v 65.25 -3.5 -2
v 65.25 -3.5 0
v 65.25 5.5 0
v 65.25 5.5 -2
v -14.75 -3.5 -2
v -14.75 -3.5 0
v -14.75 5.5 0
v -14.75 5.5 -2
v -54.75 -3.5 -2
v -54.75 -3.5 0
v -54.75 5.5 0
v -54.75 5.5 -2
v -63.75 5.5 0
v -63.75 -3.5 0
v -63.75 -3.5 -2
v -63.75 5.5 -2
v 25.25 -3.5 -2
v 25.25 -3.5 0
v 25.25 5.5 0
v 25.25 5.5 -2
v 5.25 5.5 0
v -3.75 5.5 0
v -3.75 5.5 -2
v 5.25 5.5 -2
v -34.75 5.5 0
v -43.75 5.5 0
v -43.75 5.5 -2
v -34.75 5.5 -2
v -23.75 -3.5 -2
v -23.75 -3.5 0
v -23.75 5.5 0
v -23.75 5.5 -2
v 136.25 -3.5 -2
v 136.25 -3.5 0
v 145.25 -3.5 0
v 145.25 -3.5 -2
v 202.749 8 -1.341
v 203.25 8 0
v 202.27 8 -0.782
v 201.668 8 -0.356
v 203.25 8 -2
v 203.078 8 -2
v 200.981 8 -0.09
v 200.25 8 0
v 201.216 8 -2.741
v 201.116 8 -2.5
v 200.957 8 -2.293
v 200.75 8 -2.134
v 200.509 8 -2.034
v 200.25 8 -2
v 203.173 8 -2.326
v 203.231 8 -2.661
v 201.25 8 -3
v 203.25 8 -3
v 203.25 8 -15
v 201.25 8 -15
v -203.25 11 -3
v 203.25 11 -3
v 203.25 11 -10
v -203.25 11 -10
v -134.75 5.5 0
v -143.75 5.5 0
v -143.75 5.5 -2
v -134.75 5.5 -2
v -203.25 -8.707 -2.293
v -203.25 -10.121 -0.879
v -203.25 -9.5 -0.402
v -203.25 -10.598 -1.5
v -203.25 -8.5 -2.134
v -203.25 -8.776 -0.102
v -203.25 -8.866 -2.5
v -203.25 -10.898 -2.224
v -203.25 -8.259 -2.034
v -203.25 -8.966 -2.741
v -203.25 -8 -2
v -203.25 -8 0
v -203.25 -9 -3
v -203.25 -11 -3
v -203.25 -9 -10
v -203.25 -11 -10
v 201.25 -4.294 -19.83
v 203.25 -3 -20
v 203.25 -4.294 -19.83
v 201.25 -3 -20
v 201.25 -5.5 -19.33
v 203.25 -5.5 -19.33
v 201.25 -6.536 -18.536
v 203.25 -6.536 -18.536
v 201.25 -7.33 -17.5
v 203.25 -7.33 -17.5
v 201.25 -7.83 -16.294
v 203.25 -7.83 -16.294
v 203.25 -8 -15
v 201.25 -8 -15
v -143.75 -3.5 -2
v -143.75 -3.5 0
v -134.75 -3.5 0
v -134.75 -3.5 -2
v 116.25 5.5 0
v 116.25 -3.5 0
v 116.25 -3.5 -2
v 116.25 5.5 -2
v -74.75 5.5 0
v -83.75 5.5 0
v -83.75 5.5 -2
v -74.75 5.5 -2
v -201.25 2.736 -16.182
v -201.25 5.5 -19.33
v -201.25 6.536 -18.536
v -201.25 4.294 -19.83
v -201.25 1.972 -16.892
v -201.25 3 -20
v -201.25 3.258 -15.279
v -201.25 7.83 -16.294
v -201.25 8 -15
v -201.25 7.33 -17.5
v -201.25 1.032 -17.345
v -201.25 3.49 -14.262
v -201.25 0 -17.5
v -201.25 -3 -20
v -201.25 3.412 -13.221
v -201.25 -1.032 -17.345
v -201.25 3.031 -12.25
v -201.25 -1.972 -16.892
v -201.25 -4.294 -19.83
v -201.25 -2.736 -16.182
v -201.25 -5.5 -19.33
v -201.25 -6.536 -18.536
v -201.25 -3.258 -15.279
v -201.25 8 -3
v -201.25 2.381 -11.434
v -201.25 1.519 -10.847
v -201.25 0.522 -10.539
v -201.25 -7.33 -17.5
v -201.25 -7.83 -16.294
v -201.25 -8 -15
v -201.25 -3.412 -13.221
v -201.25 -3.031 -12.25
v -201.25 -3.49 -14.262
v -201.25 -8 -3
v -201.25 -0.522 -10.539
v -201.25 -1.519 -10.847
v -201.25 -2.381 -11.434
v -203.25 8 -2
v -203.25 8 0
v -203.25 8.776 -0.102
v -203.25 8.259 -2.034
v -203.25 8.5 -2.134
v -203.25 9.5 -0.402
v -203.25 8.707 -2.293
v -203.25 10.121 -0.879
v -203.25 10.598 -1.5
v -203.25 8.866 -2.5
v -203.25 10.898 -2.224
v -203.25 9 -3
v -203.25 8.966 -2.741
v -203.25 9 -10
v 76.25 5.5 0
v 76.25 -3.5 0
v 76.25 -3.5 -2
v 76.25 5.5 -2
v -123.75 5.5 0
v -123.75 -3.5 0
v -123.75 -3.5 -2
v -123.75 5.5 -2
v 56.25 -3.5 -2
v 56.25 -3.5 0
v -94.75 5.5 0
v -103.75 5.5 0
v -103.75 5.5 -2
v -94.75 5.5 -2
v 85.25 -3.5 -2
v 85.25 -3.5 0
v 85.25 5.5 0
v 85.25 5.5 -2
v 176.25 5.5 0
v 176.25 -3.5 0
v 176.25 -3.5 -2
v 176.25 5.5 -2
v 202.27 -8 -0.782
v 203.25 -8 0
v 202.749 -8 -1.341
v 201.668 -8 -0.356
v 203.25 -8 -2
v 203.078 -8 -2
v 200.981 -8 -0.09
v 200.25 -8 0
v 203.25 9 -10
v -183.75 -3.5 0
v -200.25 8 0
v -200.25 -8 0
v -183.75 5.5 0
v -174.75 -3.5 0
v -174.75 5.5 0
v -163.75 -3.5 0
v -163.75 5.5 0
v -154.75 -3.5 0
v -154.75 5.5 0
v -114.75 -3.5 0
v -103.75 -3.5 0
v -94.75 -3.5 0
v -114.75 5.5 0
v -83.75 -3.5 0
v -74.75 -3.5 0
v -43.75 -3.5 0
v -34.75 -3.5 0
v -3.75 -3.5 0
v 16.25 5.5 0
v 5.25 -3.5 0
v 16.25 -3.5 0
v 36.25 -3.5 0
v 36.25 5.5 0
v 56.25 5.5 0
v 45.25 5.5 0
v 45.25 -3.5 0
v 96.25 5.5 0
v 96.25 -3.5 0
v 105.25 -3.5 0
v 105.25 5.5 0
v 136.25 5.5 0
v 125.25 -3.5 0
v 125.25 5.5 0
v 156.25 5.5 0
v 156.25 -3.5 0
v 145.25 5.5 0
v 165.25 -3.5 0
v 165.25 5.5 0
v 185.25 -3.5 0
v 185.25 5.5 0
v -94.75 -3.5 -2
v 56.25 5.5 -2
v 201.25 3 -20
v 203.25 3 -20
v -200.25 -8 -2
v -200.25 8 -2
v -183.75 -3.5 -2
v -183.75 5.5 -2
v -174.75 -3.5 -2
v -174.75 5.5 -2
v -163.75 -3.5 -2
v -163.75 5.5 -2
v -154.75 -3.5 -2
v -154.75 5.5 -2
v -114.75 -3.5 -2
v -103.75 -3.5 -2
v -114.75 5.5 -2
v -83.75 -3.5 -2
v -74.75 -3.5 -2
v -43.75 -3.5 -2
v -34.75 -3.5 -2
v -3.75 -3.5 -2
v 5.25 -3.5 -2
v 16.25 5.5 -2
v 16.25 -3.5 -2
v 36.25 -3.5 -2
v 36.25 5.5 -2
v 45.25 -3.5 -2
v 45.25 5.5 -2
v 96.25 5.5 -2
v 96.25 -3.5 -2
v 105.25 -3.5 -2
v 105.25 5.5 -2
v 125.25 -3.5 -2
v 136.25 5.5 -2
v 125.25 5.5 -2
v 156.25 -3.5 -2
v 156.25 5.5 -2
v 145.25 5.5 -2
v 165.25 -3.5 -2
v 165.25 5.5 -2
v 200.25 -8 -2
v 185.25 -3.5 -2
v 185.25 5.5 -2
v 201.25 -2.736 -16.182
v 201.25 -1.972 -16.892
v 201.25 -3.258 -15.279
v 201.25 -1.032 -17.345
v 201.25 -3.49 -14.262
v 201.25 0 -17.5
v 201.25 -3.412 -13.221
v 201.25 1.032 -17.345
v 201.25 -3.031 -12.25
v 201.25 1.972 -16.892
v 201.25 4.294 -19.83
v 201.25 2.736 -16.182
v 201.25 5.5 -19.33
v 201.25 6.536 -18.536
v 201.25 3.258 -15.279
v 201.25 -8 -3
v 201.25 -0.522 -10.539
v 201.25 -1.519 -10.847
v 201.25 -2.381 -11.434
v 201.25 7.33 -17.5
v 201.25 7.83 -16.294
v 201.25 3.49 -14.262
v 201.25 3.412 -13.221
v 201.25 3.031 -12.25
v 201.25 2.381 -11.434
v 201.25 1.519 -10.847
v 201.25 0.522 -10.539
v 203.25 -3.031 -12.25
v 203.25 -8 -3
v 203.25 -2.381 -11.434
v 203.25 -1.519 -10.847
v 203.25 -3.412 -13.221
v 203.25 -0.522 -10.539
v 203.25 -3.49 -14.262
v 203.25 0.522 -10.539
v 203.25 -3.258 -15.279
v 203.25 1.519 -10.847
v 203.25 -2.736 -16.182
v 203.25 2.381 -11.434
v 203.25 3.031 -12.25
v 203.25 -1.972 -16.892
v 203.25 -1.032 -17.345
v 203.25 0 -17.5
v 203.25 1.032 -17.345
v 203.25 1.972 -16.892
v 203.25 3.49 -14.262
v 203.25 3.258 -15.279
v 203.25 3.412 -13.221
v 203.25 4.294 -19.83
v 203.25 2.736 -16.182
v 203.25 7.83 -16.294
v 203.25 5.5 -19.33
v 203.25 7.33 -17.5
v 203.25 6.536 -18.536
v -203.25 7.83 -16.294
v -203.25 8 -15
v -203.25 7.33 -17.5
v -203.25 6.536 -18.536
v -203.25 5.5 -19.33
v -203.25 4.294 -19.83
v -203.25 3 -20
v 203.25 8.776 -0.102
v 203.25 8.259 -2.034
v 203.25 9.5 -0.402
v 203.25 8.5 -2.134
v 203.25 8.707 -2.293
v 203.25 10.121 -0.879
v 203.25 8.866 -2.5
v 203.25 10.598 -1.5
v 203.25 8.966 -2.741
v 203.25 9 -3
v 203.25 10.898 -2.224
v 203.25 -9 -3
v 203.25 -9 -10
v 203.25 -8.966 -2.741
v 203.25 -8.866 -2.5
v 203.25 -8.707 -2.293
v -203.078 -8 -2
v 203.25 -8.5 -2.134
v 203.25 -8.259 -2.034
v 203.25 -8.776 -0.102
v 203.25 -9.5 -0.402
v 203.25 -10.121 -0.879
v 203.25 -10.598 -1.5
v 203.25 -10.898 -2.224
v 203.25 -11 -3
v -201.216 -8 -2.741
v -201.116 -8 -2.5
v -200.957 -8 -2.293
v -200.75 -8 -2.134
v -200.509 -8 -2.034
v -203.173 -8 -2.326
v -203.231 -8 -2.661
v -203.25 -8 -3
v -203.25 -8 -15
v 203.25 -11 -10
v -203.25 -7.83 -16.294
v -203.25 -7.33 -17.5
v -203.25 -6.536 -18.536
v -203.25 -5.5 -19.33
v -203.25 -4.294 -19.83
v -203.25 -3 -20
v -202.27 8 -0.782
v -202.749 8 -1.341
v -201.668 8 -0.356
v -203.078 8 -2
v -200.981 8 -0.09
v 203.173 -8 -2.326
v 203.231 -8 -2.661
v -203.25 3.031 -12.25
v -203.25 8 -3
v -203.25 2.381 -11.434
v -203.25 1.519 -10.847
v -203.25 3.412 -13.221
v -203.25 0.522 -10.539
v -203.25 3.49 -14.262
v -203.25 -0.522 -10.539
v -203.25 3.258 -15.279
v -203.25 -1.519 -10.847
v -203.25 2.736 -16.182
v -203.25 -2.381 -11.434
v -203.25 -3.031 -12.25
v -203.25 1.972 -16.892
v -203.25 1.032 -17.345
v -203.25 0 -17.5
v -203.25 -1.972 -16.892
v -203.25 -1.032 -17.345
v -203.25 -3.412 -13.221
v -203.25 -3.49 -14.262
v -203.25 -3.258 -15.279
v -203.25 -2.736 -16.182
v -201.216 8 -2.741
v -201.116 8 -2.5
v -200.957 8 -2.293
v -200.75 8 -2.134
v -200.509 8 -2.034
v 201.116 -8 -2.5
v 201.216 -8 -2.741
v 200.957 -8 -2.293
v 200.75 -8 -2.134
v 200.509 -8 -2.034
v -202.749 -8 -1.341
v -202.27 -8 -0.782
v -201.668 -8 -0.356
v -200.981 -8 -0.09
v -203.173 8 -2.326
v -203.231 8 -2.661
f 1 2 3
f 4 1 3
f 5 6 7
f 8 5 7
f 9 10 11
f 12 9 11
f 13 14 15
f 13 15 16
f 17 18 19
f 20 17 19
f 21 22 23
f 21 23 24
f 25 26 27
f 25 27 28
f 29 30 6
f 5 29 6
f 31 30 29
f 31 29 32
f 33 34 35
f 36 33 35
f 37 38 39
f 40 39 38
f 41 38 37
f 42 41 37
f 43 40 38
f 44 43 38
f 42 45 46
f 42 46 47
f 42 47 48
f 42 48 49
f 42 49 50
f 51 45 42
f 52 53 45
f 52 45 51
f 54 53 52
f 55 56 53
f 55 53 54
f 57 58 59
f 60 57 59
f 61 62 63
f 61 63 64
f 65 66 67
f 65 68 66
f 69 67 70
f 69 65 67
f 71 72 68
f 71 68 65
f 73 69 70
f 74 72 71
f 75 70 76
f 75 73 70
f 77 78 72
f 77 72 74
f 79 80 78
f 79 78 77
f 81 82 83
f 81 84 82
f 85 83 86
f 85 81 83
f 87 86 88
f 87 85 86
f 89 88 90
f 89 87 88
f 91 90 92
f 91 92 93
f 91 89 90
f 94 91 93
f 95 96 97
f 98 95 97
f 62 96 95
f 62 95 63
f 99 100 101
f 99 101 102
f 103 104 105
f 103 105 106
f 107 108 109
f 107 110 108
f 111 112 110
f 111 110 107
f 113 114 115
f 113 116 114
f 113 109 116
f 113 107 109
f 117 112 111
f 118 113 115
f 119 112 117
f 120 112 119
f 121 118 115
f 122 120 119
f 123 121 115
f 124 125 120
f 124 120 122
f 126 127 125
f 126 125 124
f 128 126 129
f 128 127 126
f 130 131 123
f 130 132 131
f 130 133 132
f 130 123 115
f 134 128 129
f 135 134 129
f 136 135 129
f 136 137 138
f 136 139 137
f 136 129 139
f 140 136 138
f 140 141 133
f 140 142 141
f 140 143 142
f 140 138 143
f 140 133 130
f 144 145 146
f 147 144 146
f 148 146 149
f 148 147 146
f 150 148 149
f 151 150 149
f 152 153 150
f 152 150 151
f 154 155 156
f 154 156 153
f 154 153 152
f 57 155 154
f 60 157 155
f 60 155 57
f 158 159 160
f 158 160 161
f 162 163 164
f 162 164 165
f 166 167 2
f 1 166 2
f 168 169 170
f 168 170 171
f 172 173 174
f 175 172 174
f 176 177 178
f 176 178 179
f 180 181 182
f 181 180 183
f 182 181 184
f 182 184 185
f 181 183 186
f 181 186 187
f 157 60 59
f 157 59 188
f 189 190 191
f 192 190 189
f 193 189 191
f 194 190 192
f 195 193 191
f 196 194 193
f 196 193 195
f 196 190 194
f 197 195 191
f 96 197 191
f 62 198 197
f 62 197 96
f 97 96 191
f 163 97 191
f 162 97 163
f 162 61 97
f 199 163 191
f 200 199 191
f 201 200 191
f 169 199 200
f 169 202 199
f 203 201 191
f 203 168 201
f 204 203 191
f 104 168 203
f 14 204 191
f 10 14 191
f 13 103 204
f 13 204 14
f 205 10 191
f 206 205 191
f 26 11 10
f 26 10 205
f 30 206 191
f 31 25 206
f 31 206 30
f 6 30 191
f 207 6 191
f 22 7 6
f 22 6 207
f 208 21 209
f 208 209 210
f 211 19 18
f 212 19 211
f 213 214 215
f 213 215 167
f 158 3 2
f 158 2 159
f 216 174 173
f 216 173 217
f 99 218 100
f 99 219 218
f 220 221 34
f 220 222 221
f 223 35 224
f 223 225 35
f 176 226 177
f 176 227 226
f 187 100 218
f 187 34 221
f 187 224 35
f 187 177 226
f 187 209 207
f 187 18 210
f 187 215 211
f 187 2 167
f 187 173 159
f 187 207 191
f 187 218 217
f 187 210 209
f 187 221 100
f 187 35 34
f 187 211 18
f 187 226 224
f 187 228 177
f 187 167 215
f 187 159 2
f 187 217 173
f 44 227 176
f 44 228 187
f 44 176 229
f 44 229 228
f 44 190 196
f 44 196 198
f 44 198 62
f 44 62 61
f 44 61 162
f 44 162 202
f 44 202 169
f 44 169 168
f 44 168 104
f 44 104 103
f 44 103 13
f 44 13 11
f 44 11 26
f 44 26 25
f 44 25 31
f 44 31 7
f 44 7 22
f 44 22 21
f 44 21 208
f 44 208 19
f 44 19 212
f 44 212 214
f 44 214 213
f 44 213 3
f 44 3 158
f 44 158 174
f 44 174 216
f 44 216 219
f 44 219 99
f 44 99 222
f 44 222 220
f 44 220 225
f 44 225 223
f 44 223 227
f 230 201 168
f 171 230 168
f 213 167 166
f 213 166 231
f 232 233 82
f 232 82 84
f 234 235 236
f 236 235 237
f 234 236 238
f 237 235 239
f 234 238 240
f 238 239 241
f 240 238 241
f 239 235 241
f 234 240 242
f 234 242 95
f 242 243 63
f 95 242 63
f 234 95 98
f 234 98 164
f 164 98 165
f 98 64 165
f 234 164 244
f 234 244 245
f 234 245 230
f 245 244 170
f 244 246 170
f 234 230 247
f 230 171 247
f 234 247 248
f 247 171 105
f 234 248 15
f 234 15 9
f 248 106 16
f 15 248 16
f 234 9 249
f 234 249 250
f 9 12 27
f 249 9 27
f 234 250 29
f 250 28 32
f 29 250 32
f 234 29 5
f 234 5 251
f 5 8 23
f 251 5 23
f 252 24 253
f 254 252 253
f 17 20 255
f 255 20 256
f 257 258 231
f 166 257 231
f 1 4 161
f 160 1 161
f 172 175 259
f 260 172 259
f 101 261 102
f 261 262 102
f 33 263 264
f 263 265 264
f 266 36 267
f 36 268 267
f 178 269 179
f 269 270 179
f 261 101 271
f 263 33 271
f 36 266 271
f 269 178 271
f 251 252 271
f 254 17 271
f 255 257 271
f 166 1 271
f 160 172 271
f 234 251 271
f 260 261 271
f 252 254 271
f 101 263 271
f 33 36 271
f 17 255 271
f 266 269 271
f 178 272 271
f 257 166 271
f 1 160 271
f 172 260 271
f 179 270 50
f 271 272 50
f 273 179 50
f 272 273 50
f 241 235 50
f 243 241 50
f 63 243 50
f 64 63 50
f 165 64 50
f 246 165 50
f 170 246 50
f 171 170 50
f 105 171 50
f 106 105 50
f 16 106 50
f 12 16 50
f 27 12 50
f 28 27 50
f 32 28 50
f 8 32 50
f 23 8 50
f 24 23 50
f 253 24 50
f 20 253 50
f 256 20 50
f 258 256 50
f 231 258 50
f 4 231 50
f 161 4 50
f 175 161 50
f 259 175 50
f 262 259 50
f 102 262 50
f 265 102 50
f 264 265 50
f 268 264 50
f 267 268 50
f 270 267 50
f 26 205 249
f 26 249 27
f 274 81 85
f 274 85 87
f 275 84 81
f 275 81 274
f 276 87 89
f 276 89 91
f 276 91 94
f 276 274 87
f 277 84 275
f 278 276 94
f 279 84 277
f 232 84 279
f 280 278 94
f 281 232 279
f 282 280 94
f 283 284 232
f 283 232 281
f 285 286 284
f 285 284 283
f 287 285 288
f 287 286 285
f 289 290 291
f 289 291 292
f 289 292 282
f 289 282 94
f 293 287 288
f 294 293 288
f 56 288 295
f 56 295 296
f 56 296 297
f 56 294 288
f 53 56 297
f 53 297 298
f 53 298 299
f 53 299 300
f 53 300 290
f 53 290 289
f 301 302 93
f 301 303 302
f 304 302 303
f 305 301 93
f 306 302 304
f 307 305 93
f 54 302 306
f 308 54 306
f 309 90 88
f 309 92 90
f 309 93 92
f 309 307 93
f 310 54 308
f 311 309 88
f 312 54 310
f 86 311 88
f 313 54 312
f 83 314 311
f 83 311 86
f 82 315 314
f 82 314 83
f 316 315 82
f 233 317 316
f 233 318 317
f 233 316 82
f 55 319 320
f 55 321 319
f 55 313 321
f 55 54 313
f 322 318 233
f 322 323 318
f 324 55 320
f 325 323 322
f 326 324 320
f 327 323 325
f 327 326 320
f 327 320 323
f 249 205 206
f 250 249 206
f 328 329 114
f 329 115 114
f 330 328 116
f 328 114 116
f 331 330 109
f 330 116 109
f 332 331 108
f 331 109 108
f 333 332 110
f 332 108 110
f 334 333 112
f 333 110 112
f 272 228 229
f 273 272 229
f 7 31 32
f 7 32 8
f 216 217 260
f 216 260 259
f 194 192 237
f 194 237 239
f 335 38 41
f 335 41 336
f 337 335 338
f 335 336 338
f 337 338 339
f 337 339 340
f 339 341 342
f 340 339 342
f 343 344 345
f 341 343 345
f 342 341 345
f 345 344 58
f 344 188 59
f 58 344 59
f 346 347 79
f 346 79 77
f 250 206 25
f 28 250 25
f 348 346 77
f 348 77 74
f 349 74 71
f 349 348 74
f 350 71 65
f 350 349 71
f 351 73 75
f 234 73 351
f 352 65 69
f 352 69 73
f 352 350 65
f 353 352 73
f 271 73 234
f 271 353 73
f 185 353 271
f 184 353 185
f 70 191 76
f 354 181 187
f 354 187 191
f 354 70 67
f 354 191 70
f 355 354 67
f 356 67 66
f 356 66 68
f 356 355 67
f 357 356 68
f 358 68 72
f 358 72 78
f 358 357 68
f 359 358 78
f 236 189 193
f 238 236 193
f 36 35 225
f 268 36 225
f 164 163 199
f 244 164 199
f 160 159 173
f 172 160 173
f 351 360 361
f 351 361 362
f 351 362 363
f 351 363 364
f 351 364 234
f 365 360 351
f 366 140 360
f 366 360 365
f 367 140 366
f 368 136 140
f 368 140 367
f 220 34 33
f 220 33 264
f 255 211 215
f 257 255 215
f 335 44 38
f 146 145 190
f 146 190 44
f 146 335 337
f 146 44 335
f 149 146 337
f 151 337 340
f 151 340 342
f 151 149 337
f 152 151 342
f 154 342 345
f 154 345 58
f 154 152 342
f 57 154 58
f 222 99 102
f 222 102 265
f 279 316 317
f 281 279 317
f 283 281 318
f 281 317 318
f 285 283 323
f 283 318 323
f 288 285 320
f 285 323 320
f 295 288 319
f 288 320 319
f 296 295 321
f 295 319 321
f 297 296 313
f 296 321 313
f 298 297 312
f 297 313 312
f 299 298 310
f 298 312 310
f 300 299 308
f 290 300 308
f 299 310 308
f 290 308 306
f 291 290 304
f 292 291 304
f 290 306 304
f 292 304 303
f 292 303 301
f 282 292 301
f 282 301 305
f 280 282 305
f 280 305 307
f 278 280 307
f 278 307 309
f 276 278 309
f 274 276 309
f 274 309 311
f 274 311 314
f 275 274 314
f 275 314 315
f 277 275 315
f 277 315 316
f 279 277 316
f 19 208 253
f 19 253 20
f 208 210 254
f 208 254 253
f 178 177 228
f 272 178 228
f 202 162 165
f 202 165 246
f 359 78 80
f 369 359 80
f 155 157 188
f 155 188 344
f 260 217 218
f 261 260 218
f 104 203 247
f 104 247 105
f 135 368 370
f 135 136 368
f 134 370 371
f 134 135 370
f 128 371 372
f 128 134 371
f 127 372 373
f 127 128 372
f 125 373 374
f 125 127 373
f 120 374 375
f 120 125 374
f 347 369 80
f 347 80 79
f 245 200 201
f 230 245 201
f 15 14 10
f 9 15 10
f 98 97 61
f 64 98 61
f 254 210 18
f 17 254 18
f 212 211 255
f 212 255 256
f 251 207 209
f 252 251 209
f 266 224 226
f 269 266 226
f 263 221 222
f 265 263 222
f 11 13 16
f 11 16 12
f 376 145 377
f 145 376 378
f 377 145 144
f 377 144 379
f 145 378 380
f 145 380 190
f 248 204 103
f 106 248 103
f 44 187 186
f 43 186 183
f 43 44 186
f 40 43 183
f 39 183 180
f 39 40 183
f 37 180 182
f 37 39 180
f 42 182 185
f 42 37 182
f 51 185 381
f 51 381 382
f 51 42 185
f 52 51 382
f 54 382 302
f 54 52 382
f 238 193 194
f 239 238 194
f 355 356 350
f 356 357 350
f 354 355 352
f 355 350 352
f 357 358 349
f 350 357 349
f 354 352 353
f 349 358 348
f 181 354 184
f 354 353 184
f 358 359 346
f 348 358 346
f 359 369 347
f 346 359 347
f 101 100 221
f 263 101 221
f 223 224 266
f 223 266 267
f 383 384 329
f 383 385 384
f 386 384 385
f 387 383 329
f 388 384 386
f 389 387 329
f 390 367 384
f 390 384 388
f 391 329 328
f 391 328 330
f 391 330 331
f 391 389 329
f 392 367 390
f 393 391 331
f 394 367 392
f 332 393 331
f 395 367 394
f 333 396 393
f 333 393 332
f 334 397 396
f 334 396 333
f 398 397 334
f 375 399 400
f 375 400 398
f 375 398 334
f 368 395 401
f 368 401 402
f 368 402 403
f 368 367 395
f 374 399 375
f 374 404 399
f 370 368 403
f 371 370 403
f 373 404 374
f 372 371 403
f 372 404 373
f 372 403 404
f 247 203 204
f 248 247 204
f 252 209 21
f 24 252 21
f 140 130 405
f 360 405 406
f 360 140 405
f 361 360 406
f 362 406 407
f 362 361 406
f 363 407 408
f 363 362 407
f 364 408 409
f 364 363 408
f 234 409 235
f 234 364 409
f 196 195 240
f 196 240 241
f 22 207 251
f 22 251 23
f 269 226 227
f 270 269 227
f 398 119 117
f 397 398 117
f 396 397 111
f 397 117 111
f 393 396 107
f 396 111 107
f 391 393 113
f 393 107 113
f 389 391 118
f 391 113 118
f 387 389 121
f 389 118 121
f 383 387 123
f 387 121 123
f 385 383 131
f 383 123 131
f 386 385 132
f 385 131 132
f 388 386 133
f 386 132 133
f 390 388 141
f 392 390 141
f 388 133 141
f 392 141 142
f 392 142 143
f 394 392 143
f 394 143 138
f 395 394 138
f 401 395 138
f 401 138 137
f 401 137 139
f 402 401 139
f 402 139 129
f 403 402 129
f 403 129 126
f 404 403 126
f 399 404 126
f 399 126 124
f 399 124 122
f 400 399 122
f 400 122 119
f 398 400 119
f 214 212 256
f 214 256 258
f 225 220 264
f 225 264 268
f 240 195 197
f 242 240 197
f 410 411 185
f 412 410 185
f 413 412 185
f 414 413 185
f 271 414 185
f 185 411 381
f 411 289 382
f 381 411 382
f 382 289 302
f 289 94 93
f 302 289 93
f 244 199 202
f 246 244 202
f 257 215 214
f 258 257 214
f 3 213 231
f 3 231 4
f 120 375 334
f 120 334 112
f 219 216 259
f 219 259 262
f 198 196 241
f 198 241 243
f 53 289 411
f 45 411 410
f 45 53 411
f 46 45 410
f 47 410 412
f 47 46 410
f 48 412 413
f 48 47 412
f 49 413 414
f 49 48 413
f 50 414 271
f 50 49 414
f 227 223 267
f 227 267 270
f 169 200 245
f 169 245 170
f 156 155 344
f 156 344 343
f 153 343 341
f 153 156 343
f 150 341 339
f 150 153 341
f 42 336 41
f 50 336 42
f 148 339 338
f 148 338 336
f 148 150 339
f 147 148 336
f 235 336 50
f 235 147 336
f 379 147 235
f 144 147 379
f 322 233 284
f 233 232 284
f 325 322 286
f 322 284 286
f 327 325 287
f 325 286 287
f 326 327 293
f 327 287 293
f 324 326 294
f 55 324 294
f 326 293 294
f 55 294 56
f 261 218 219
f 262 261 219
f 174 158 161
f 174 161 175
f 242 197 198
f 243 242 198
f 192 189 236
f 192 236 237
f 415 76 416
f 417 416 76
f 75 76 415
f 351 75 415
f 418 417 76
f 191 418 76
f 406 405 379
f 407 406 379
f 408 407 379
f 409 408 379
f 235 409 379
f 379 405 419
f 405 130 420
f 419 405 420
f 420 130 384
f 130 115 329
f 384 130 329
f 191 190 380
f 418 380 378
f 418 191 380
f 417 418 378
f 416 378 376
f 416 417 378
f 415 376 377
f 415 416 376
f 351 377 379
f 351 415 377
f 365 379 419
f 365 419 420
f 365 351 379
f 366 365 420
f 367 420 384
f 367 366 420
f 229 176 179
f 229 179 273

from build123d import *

# Parameters (mm, degrees)
SKETCH_1_W                         = 406.5
SKETCH_1_H                         = 22
SM_BASE_FLANGE_1_DEPTH             = 2
SM_EDGE_FLANGE_1_STRIP_W           = 10
SM_EDGE_FLANGE_1_STRIP_H           = 2
SM_EDGE_FLANGE_1_STRIP_CUT_DEPTH   = 406.5
SM_EDGE_FLANGE_1_STRIP_2_W         = 10
SM_EDGE_FLANGE_1_STRIP_2_H         = 2
SM_EDGE_FLANGE_1_STRIP_CUT_2_DEPTH = 406.5
SM_EDGE_FLANGE_1_DEPTH             = 406.5
SM_EDGE_FLANGE_1_BEND_DEPTH        = 406.5
SM_EDGE_FLANGE_2_STRIP_W           = 10
SM_EDGE_FLANGE_2_STRIP_H           = 2
SM_EDGE_FLANGE_2_STRIP_CUT_DEPTH   = 16
SM_EDGE_FLANGE_2_STRIP_2_W         = 10
SM_EDGE_FLANGE_2_STRIP_2_H         = 2
SM_EDGE_FLANGE_2_STRIP_CUT_2_DEPTH = 16
SM_EDGE_FLANGE_2_DEPTH             = 16
SM_EDGE_FLANGE_2_BEND_DEPTH        = 16
SKETCH_18_W                        = 9
SKETCH_18_H                        = 9
CUT_EXTRUDE_1_DEPTH                = 10
PATTERN_LINEAR_1_COUNT             = 19
PATTERN_LINEAR_1_PITCH             = 20
FILLET_1_R                         = 5
SKETCH_19_R                        = 3.5
CUT_EXTRUDE_2_DEPTH                = 408.140332072


# Sheet-metal steps are written as plain solids
with BuildPart() as part:
    # Sketch 1 → 基体-法兰1 (new body)
    with BuildSketch(Plane.XY):
        Rectangle(SKETCH_1_W, SKETCH_1_H)
    extrude(amount=-SM_BASE_FLANGE_1_DEPTH)

    # 边线-法兰1 strip (across the edge) → 边线-法兰1 strip cut (cut)
    with BuildSketch(Plane(origin=(203.25, -11, -2), x_dir=(0, 1, 0), z_dir=(-1, 0, 0))):
        with Locations((-2, -1)):
            Rectangle(SM_EDGE_FLANGE_1_STRIP_W, SM_EDGE_FLANGE_1_STRIP_H)
    extrude(amount=SM_EDGE_FLANGE_1_STRIP_CUT_DEPTH, mode=Mode.SUBTRACT)

    # 边线-法兰1 strip 2 (across the edge) → 边线-法兰1 strip cut 2 (cut)
    with BuildSketch(Plane(origin=(-203.25, 11, -2), x_dir=(0, -1, 0), z_dir=(1, 0, 0))):
        with Locations((-2, -1)):
            Rectangle(SM_EDGE_FLANGE_1_STRIP_2_W, SM_EDGE_FLANGE_1_STRIP_2_H)
    extrude(amount=SM_EDGE_FLANGE_1_STRIP_CUT_2_DEPTH, mode=Mode.SUBTRACT)

    # 边线-法兰1 section (across the edge) → 边线-法兰1 (add)
    with BuildSketch(Plane(origin=(203.25, -11, -2), x_dir=(0, 1, 0), z_dir=(-1, 0, 0))):
        with BuildLine():
            Line((0, 1), (0, 8))
            Line((0, 8), (2, 8))
            Line((2, 8), (2, 1))
            ThreePointArc((2, 1), (2.292893219, 0.292893219), (3, 0))
            Line((3, 0), (3, -2))
            ThreePointArc((3, -2), (0.878679656, -1.121320344), (0, 1))
        make_face()
    extrude(amount=SM_EDGE_FLANGE_1_DEPTH)

    # 边线-法兰1 section 2 (across the edge) → 边线-法兰1 bend (add)
    with BuildSketch(Plane(origin=(-203.25, 11, -2), x_dir=(0, -1, 0), z_dir=(1, 0, 0))):
        with BuildLine():
            Line((0, 1), (0, 8))
            Line((0, 8), (2, 8))
            Line((2, 8), (2, 1))
            ThreePointArc((2, 1), (2.292893219, 0.292893219), (3, 0))
            Line((3, 0), (3, -2))
            ThreePointArc((3, -2), (0.878679656, -1.121320344), (0, 1))
        make_face()
    extrude(amount=SM_EDGE_FLANGE_1_BEND_DEPTH)

    # 边线-法兰2 strip (across the edge) → 边线-法兰2 strip cut (cut)
    with BuildSketch(Plane(origin=(-203.25, -8, -2), x_dir=(1, 0, 0), z_dir=(0, 1, 0))):
        with Locations((-2, -1)):
            Rectangle(SM_EDGE_FLANGE_2_STRIP_W, SM_EDGE_FLANGE_2_STRIP_H)
    extrude(amount=SM_EDGE_FLANGE_2_STRIP_CUT_DEPTH, mode=Mode.SUBTRACT)

    # 边线-法兰2 strip 2 (across the edge) → 边线-法兰2 strip cut 2 (cut)
    with BuildSketch(Plane(origin=(203.25, 8, -2), x_dir=(-1, 0, 0), z_dir=(0, -1, 0))):
        with Locations((-2, -1)):
            Rectangle(SM_EDGE_FLANGE_2_STRIP_2_W, SM_EDGE_FLANGE_2_STRIP_2_H)
    extrude(amount=SM_EDGE_FLANGE_2_STRIP_CUT_2_DEPTH, mode=Mode.SUBTRACT)

    # 边线-法兰2 section (across the edge) → 边线-法兰2 (add)
    with BuildSketch(Plane(origin=(-203.25, -8, -2), x_dir=(1, 0, 0), z_dir=(0, 1, 0))):
        with BuildLine():
            Line((0, 1), (0, 18))
            Line((0, 18), (2, 18))
            Line((2, 18), (2, 1))
            ThreePointArc((2, 1), (2.292893219, 0.292893219), (3, 0))
            Line((3, 0), (3, -2))
            ThreePointArc((3, -2), (0.878679656, -1.121320344), (0, 1))
        make_face()
    extrude(amount=SM_EDGE_FLANGE_2_DEPTH)

    # 边线-法兰2 section 2 (across the edge) → 边线-法兰2 bend (add)
    with BuildSketch(Plane(origin=(203.25, 8, -2), x_dir=(-1, 0, 0), z_dir=(0, -1, 0))):
        with BuildLine():
            Line((0, 1), (0, 18))
            Line((0, 18), (2, 18))
            Line((2, 18), (2, 1))
            ThreePointArc((2, 1), (2.292893219, 0.292893219), (3, 0))
            Line((3, 0), (3, -2))
            ThreePointArc((3, -2), (0.878679656, -1.121320344), (0, 1))
        make_face()
    extrude(amount=SM_EDGE_FLANGE_2_BEND_DEPTH)

    # 草图18 → 切除-拉伸1 (cut)
    with BuildSketch(Plane.XY):
        with Locations((-179.25, 1)):
            Rectangle(SKETCH_18_W, SKETCH_18_H)
    cut_extrude_1 = extrude(amount=-CUT_EXTRUDE_1_DEPTH, mode=Mode.SUBTRACT)

    # 阵列(线性)1: 切除-拉伸1 ×19
    with Locations(*[(i * PATTERN_LINEAR_1_PITCH, 0, 0) for i in range(1, PATTERN_LINEAR_1_COUNT)]):
        add(cut_extrude_1, mode=Mode.SUBTRACT)

    # 圆角1
    fillet_1_edges = [part.edges().sort_by_distance(p)[0] for p in [
        (-202.25, -8, -20),
        (-202.25, 8, -20),
        (202.25, 8, -20),
        (202.25, -8, -20),
    ]]
    fillet(fillet_1_edges, radius=FILLET_1_R)

    # 草图19 → 切除-拉伸2 (cut, through all)
    with BuildSketch(Plane(origin=(203.25, 0, 0), x_dir=(0, 0, -1), z_dir=(1, 0, 0))):
        with Locations((14, 0)):
            Circle(SKETCH_19_R)
    extrude(amount=-CUT_EXTRUDE_2_DEPTH, mode=Mode.SUBTRACT)


solid = part.part
